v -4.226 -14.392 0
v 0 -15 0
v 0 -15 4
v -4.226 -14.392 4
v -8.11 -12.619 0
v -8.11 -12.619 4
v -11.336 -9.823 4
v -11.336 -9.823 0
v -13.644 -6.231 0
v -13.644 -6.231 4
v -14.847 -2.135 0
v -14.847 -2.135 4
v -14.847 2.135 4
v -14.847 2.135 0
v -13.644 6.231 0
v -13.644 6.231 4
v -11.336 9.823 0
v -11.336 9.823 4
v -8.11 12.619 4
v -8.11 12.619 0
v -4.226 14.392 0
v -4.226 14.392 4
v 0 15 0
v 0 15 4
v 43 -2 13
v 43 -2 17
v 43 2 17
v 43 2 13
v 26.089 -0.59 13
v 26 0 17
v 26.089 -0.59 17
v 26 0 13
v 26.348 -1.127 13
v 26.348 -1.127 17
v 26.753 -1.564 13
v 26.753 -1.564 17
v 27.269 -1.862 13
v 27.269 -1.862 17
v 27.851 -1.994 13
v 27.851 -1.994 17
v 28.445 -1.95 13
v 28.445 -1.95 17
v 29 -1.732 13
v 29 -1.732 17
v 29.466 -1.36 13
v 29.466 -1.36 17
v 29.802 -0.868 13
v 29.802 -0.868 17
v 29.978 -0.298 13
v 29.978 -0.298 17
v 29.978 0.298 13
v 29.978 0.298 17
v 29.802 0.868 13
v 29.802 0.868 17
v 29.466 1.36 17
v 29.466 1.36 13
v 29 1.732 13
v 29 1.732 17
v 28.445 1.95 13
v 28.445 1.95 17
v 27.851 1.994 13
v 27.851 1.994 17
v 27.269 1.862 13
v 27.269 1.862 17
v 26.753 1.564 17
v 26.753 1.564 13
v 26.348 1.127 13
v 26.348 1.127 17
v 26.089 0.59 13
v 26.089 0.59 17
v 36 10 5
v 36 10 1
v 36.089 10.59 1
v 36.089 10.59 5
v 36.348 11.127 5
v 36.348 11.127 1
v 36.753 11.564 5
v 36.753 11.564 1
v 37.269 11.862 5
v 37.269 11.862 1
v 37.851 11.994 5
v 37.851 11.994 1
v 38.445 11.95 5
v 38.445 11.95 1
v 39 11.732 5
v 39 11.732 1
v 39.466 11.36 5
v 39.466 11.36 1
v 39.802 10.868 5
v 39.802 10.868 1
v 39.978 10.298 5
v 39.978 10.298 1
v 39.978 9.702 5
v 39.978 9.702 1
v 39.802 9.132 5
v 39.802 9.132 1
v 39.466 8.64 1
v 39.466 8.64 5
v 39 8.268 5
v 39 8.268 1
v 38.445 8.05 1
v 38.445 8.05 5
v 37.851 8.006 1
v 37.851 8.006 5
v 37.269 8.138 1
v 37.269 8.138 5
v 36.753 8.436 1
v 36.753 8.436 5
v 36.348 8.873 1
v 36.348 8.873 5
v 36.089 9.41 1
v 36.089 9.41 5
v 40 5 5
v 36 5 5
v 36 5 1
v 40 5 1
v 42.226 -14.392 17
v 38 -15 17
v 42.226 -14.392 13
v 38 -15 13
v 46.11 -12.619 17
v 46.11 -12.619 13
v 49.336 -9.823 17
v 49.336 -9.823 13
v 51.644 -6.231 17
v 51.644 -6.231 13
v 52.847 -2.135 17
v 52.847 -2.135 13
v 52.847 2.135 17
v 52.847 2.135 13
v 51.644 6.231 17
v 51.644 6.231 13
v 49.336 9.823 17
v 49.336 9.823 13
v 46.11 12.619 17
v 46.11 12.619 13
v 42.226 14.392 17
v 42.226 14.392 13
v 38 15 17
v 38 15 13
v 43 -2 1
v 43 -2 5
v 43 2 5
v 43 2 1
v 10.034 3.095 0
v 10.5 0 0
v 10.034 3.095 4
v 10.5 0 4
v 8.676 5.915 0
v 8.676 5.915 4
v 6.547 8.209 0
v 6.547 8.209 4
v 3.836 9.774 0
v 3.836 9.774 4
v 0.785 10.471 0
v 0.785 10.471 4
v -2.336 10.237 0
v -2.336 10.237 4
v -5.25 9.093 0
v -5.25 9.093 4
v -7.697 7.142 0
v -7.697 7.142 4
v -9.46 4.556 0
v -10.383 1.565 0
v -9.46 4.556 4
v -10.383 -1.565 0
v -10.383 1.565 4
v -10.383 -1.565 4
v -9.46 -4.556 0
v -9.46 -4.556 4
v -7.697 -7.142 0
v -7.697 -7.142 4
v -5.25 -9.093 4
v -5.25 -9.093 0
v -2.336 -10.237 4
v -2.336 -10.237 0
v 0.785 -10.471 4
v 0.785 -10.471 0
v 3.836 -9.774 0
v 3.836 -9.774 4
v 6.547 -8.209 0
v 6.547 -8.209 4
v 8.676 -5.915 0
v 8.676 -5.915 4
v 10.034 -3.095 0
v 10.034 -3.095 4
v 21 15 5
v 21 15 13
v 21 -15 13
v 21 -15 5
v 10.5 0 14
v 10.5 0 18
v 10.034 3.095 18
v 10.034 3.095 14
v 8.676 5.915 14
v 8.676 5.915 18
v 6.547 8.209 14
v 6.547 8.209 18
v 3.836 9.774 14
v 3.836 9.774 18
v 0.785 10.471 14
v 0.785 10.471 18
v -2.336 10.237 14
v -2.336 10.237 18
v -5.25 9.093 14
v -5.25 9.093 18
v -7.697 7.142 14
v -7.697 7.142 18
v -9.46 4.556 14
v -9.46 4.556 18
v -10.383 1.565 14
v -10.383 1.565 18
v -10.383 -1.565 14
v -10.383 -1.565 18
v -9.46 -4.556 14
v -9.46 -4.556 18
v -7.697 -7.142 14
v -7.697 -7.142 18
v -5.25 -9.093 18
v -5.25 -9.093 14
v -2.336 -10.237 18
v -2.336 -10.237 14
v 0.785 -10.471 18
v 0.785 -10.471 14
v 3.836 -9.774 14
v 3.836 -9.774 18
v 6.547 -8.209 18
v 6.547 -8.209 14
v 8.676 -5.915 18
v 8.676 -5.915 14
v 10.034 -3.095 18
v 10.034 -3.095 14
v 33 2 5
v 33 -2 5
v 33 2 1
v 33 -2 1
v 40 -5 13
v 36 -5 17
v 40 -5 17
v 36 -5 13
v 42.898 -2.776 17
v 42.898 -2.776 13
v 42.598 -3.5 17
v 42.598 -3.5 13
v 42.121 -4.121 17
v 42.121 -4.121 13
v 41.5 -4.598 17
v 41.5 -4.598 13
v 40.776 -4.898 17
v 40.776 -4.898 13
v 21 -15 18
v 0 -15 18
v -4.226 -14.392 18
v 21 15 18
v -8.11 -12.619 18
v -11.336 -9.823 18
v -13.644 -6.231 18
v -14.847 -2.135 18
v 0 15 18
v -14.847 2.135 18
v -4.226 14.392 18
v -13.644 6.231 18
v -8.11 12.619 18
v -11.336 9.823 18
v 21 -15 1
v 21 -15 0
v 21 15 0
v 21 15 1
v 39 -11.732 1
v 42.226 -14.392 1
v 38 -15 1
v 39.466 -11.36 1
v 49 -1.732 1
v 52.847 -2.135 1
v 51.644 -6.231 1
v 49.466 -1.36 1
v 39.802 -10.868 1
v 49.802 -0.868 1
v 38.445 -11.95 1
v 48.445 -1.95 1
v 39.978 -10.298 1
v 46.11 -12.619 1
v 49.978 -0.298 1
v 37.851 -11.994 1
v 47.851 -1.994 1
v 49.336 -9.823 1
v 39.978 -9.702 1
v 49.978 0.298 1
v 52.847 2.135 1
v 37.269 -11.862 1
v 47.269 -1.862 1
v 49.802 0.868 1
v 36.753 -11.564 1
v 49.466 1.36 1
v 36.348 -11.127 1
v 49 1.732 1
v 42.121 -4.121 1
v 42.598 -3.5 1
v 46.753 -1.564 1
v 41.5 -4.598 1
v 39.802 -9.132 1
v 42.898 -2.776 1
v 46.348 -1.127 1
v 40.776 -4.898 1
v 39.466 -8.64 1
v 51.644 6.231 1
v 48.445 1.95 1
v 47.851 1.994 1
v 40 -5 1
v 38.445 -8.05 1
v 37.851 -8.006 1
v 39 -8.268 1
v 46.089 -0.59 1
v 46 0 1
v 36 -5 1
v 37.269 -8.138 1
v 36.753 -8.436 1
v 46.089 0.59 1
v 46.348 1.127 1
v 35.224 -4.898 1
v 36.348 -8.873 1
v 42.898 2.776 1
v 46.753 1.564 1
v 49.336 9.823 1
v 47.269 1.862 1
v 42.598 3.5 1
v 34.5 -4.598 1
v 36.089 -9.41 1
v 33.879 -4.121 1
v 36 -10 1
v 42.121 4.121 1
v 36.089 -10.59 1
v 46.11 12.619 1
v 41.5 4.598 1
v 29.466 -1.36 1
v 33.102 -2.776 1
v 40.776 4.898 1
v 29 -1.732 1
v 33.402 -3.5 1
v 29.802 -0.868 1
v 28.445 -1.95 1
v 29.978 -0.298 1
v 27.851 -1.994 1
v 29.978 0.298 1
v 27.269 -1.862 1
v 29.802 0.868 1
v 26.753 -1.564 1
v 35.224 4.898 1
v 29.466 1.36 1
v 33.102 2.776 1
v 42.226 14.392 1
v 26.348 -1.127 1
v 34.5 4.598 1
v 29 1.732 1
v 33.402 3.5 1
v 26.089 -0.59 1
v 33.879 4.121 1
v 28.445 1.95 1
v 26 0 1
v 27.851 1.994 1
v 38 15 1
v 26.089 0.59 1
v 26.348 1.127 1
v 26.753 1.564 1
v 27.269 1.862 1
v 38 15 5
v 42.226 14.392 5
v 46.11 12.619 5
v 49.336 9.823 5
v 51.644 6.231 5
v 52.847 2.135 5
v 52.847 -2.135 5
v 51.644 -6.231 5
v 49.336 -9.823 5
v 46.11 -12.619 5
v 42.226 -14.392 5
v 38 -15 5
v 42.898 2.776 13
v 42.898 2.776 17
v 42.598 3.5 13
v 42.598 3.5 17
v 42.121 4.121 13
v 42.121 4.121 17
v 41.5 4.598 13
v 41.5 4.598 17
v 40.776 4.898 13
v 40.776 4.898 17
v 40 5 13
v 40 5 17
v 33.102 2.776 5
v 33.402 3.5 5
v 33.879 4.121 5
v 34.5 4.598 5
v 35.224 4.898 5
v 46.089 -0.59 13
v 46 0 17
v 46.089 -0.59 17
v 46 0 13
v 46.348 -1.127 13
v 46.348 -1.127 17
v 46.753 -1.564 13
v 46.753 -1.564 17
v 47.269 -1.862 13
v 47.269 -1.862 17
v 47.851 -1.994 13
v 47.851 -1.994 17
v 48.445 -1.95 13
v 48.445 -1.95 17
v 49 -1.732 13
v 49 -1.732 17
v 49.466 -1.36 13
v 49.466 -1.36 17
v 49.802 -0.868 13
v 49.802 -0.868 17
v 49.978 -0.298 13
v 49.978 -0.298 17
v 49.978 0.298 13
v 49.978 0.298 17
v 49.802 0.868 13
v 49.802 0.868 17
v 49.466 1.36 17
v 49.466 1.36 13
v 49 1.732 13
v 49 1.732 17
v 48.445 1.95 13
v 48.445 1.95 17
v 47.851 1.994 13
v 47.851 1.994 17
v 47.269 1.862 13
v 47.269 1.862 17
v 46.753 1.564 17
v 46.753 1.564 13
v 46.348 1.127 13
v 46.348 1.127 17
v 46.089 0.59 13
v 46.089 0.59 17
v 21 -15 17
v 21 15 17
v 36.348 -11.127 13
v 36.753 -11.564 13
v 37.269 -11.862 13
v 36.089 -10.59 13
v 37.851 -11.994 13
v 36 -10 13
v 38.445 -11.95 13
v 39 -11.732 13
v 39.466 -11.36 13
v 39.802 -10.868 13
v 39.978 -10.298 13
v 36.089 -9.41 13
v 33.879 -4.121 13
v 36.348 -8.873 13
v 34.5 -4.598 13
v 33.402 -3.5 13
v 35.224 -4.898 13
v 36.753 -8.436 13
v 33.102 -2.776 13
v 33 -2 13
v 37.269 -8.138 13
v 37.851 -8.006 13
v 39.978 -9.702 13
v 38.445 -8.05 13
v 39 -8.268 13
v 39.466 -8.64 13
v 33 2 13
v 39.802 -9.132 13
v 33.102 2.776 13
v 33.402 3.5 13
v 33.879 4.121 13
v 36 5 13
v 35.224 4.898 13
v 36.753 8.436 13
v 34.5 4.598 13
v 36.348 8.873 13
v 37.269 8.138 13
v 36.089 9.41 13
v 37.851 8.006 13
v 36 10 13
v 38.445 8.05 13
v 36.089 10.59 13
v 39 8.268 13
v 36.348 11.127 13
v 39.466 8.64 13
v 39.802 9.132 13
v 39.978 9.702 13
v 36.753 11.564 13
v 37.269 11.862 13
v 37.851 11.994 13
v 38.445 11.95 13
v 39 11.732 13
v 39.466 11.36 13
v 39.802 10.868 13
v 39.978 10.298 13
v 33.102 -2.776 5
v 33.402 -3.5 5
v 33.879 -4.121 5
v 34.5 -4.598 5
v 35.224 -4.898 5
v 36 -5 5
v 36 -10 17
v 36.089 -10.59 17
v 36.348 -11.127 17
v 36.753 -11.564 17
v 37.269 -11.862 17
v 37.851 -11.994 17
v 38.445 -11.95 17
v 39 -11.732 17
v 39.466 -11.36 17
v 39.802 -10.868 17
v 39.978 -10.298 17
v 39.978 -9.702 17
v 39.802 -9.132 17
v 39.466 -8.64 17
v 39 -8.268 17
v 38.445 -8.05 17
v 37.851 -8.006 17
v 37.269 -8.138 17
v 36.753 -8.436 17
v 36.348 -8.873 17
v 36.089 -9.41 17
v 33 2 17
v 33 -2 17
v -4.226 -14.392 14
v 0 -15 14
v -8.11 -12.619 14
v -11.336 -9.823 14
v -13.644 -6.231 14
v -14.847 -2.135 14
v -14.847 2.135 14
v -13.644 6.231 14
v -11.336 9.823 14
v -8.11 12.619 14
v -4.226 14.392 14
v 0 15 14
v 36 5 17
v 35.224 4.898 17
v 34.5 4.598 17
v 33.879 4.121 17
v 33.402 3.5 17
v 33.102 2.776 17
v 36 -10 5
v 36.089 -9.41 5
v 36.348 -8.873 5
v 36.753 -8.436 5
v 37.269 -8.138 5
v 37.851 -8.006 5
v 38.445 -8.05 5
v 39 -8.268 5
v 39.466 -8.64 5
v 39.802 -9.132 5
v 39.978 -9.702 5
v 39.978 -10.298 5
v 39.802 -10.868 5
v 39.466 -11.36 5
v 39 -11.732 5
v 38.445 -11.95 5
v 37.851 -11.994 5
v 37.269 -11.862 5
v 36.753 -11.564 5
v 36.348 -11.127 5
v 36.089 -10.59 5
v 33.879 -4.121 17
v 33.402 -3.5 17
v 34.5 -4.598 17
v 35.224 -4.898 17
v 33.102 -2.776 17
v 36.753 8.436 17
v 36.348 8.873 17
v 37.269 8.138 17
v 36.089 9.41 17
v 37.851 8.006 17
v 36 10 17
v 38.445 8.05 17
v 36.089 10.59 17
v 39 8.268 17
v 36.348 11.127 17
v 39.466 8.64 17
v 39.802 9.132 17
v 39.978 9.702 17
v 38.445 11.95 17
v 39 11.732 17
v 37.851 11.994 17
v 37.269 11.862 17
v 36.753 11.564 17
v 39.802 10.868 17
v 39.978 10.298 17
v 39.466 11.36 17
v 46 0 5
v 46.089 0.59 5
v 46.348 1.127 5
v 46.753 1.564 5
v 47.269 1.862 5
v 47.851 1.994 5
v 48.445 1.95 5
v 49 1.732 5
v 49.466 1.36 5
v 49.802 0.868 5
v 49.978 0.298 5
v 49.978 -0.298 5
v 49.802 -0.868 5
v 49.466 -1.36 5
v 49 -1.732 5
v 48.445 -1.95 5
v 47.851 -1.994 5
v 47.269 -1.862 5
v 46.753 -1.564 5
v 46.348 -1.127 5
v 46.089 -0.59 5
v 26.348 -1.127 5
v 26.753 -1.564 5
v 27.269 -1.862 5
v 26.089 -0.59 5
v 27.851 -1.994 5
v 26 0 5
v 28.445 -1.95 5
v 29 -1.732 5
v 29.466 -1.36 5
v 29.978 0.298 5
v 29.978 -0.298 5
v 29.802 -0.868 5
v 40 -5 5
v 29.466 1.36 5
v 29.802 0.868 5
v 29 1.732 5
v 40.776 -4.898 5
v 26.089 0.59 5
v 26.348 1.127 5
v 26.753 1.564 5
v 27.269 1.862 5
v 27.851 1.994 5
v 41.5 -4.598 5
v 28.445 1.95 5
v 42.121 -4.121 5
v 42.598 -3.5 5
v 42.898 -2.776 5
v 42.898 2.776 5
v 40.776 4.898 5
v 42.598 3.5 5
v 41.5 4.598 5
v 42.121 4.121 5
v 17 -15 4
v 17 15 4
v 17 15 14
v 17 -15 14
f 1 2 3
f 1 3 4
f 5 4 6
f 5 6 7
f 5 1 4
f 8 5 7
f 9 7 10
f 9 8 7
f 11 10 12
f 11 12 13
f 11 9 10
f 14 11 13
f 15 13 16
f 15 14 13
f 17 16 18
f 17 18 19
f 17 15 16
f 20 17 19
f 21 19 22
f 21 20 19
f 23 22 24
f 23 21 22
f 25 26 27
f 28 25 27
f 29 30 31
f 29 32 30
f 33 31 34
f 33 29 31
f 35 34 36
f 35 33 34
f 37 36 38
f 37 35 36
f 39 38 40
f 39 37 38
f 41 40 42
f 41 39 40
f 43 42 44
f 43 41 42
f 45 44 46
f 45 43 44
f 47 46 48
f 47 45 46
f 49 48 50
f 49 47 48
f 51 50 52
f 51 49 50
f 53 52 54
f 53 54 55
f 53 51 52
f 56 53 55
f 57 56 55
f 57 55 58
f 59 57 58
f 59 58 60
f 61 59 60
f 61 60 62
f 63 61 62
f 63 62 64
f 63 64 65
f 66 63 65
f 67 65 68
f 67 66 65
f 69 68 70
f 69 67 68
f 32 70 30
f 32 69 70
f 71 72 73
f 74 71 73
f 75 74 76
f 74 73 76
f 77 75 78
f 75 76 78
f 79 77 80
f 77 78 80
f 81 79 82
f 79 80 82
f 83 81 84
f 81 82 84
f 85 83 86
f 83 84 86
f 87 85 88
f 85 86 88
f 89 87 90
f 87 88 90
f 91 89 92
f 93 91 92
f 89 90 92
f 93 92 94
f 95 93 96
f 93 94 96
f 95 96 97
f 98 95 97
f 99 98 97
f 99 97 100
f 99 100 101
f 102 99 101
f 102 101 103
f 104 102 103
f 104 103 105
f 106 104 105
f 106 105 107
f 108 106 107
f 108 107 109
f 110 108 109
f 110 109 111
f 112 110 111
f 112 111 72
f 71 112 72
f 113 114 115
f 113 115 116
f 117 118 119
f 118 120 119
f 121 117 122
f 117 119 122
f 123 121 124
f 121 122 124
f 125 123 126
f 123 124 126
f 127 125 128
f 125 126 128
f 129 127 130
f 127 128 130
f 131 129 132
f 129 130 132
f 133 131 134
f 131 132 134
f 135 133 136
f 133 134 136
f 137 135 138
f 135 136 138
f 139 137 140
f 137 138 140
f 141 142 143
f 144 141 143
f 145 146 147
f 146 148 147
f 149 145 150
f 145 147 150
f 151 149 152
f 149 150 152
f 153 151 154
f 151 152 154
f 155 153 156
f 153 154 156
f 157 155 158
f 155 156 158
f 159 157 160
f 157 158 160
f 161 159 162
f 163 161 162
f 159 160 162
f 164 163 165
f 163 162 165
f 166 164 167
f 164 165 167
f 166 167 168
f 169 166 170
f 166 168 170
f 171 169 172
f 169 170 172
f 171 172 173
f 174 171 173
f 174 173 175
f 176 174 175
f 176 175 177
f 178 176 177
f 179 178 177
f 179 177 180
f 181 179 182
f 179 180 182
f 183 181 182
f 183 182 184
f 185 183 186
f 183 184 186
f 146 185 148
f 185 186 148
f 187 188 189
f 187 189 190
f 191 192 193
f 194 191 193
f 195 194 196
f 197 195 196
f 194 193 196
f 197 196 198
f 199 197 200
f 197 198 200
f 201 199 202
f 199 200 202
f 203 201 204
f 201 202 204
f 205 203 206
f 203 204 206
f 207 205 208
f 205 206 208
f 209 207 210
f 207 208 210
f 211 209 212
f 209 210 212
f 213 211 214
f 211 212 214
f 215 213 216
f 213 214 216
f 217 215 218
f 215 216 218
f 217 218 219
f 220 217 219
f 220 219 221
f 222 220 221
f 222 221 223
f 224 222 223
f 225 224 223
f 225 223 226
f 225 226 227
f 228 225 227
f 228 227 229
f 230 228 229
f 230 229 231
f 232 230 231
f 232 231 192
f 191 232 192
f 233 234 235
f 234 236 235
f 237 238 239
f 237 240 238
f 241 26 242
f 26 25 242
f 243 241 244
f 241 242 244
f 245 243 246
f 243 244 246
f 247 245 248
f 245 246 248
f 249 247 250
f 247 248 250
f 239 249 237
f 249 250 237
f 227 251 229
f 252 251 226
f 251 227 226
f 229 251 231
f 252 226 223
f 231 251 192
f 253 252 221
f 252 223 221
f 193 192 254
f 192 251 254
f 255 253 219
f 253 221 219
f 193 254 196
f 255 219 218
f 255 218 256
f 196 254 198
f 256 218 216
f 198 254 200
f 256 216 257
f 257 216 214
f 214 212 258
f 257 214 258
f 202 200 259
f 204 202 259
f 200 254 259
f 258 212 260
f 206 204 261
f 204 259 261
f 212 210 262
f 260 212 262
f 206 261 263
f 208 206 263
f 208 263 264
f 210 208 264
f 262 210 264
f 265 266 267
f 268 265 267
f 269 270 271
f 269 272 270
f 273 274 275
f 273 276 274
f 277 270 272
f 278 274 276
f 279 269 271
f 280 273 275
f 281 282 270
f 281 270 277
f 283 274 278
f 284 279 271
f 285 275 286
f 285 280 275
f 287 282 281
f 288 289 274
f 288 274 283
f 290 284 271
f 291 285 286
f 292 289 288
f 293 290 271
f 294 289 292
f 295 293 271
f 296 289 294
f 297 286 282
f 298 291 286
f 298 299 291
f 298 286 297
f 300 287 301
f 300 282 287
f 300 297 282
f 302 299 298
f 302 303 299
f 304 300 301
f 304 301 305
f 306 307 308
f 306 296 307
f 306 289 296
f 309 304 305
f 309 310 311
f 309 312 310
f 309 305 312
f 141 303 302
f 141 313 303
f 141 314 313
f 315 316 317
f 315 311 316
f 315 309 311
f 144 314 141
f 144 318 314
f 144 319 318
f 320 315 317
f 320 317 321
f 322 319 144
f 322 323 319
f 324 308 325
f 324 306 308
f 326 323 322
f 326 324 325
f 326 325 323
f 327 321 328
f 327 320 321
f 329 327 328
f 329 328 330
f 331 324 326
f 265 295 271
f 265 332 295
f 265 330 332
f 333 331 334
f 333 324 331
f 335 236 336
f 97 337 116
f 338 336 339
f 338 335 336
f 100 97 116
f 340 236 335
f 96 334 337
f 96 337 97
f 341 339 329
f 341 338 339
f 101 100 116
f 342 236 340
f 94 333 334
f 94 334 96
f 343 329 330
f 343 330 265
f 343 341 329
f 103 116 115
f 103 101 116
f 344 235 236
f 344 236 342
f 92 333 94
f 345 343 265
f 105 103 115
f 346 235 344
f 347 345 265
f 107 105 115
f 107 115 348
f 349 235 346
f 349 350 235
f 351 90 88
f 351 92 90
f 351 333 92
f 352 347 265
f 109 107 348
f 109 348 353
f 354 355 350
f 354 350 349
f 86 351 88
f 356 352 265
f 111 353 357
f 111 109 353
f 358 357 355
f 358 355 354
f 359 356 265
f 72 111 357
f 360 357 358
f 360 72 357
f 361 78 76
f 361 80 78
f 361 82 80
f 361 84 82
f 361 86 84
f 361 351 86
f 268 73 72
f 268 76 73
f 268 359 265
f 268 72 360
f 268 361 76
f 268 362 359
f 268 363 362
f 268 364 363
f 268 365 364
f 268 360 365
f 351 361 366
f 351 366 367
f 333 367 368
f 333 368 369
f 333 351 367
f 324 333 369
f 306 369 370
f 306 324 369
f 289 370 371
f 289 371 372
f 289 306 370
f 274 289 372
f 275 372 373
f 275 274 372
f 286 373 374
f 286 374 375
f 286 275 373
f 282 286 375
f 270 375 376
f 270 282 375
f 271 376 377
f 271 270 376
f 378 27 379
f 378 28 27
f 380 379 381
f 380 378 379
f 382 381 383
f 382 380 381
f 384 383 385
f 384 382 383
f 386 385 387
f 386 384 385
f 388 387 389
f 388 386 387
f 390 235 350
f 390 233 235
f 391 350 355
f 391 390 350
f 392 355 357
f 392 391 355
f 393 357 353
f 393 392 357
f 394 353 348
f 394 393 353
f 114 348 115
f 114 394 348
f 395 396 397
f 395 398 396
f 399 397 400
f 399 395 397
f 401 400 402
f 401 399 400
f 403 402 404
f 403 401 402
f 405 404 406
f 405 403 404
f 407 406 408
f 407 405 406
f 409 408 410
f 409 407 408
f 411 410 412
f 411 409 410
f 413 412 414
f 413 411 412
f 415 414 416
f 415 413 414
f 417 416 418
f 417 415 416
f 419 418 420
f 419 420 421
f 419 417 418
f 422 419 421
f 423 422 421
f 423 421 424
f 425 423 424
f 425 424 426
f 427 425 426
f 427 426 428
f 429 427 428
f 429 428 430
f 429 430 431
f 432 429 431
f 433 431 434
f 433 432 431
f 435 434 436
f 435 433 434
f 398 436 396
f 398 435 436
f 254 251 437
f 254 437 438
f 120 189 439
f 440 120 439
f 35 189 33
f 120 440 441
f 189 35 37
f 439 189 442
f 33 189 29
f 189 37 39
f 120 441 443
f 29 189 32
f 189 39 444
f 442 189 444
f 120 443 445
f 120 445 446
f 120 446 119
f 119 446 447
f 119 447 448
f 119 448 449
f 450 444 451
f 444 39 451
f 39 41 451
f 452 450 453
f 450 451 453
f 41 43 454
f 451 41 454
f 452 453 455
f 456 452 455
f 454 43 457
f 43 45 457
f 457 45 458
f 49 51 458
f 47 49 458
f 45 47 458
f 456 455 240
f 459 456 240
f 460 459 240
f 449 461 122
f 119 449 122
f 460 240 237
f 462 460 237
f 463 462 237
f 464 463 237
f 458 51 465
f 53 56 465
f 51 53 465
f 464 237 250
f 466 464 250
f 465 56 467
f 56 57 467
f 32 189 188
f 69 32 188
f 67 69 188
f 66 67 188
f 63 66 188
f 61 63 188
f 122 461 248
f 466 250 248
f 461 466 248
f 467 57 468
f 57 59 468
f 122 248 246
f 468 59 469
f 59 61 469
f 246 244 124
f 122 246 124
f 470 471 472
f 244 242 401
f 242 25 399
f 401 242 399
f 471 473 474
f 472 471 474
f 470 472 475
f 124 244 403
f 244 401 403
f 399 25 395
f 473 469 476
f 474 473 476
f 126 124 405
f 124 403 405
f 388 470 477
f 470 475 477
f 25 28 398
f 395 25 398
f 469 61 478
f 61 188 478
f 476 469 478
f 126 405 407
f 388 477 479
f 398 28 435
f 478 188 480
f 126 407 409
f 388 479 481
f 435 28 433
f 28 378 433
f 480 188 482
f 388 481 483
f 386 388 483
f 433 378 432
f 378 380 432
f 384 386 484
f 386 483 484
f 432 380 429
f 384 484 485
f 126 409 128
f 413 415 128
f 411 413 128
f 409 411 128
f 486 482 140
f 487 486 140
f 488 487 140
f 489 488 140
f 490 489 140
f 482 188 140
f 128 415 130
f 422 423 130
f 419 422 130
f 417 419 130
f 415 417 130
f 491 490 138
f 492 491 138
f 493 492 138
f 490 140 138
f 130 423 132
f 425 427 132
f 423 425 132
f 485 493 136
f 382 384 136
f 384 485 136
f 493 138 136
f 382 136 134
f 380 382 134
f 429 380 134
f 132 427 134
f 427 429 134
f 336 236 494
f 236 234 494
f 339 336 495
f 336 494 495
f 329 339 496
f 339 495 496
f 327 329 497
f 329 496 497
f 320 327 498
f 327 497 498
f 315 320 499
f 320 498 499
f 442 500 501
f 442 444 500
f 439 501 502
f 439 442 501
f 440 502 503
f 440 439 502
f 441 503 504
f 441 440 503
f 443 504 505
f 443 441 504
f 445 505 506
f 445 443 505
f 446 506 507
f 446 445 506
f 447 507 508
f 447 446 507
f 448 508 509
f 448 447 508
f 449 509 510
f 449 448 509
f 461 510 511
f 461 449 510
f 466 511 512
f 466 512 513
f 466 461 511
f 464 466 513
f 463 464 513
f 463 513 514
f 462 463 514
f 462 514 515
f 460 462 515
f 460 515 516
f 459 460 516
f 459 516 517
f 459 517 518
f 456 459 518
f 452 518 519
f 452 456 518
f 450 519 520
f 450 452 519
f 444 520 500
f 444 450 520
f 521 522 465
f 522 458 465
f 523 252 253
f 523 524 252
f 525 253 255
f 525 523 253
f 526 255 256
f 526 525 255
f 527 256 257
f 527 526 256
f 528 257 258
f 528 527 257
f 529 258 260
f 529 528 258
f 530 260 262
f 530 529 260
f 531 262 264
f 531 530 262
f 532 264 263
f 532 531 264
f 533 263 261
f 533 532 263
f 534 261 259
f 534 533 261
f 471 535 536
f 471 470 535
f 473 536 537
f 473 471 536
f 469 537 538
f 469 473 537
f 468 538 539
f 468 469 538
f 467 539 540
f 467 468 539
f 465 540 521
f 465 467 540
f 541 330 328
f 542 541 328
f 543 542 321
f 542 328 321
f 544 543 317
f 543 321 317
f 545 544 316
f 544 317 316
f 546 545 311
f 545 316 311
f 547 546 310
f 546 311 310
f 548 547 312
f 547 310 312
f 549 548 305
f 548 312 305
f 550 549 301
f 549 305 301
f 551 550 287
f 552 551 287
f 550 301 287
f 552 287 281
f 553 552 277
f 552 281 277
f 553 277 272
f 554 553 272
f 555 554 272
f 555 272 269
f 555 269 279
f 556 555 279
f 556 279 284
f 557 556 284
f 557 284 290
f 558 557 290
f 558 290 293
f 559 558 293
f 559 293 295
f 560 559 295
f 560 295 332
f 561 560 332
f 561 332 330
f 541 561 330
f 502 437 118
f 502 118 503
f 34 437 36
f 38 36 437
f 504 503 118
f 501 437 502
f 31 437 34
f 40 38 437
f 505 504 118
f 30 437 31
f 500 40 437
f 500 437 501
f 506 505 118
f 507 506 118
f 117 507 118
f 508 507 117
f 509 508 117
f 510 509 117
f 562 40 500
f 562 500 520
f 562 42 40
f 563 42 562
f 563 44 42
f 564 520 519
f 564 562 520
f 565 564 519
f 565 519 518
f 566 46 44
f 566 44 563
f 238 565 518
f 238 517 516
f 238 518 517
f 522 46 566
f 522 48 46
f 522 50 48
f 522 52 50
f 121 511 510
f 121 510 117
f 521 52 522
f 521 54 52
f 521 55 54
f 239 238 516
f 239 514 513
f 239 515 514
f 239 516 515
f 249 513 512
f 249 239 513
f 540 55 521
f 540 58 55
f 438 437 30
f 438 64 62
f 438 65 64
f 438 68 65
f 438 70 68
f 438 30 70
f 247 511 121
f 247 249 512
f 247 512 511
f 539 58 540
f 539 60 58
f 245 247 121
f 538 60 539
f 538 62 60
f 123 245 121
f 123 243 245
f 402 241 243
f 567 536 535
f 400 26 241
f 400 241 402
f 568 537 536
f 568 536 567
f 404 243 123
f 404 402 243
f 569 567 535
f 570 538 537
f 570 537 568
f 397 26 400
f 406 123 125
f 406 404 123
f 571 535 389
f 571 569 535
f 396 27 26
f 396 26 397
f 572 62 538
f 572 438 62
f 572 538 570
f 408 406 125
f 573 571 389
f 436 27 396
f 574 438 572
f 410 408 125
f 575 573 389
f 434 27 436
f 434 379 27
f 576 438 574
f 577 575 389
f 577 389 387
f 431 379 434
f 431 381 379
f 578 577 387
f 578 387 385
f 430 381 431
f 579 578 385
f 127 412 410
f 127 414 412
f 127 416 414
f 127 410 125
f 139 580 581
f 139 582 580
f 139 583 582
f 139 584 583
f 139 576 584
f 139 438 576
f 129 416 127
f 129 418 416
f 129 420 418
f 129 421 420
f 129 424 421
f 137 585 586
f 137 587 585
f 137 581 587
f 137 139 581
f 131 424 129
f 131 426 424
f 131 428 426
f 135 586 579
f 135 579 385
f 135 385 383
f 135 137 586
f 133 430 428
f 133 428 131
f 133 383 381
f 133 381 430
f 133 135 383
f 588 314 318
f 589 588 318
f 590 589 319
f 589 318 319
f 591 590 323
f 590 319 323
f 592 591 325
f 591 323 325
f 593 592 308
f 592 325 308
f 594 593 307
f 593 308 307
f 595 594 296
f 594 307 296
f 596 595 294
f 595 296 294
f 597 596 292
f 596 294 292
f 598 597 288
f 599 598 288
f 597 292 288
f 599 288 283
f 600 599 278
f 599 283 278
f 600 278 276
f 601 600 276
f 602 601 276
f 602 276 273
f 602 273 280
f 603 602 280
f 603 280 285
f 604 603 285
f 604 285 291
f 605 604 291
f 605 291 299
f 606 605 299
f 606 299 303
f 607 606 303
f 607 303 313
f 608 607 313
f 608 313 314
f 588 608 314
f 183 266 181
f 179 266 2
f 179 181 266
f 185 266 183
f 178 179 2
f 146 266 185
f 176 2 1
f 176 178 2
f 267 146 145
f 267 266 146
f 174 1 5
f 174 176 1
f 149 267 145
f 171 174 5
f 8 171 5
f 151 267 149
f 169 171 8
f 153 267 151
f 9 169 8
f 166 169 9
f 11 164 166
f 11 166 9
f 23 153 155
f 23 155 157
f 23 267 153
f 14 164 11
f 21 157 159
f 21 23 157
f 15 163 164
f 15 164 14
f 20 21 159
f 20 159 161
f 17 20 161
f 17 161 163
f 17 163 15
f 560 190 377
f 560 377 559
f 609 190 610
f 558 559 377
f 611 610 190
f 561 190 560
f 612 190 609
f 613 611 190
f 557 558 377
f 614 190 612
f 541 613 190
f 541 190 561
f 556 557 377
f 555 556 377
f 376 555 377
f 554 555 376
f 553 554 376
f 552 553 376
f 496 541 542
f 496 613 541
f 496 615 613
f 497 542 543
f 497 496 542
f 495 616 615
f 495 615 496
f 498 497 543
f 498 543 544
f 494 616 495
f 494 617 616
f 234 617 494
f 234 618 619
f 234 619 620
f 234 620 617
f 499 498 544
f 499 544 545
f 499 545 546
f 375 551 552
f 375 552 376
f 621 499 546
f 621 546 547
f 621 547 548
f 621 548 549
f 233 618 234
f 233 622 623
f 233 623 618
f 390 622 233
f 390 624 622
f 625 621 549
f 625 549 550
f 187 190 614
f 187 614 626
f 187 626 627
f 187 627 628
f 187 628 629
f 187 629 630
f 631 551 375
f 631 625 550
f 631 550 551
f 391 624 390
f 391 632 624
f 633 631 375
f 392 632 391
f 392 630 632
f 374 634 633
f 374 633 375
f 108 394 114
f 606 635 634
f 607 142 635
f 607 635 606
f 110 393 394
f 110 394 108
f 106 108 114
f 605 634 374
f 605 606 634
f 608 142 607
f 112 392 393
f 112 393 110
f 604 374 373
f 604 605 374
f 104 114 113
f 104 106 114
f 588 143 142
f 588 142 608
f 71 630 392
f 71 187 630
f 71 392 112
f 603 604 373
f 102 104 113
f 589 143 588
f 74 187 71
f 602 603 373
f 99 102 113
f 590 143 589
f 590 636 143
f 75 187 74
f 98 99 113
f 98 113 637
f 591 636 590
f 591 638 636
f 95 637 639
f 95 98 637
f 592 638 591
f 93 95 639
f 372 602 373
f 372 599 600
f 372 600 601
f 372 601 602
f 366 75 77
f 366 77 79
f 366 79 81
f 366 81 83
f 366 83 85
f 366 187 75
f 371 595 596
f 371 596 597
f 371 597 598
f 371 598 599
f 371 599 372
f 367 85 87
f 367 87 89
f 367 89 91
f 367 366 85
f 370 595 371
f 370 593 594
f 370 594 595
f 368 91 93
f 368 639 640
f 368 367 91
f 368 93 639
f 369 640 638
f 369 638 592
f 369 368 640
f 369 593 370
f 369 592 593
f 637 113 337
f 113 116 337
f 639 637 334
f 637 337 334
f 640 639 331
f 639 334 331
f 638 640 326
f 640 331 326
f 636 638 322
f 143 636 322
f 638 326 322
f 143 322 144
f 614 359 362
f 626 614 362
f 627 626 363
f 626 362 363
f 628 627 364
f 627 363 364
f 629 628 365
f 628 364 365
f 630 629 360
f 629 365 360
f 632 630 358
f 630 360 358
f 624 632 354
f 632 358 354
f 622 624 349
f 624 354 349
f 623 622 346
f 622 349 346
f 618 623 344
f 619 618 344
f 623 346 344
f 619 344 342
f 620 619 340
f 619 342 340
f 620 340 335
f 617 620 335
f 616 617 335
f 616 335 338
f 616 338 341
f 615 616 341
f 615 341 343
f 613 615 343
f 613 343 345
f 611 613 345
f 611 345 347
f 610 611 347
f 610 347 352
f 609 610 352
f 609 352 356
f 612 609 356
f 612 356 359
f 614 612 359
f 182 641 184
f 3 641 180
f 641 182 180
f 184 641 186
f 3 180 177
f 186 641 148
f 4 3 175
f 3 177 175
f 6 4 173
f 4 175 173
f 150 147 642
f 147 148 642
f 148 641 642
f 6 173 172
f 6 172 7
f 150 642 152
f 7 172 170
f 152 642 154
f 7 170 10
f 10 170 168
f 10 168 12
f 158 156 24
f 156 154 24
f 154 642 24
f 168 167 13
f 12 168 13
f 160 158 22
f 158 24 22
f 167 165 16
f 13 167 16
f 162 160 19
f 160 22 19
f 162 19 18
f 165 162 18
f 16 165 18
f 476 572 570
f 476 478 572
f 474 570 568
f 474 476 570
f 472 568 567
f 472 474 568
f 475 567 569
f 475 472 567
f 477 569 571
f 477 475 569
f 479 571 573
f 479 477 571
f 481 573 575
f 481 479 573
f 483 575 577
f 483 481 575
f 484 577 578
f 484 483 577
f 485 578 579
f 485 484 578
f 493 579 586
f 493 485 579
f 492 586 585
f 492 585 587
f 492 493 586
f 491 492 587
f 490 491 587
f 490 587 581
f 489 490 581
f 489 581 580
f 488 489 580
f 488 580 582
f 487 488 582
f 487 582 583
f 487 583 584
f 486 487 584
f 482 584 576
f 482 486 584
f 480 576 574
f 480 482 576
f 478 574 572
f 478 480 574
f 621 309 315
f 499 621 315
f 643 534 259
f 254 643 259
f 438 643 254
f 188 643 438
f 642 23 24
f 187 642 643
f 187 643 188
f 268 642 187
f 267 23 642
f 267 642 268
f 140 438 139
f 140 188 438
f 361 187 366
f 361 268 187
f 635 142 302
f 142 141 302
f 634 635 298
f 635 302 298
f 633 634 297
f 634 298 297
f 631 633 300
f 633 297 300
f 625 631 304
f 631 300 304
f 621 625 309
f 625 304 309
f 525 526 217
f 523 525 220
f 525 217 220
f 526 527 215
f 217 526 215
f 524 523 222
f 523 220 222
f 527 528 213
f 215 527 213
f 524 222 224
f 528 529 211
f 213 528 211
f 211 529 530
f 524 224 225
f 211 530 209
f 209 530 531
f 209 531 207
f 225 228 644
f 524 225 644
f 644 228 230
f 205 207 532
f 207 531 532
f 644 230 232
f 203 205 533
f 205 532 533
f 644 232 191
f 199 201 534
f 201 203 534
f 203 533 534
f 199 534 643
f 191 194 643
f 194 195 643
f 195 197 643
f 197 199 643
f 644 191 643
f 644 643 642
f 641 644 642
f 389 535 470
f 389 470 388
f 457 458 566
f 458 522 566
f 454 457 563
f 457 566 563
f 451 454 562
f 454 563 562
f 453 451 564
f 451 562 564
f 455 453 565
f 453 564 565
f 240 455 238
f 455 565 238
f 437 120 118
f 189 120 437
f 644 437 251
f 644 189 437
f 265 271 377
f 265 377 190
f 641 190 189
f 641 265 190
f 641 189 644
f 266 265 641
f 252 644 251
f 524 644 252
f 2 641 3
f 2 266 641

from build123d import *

# Parameters (mm, degrees)
EXTRUDE_1_DEPTH     = 18
SKETCH_2_W          = 32
SKETCH_2_H          = 12
CUT_EXTRUDE_1_DEPTH = 34
SKETCH_3_W          = 32
SKETCH_3_H          = 8
CUT_EXTRUDE_2_DEPTH = 34
SKETCH_4_R          = 10.5
CUT_EXTRUDE_3_DEPTH = 34
SKETCH_5_W          = 36.797591779
SKETCH_5_H          = 31.340238438
CUT_EXTRUDE_4_DEPTH = 2
SKETCH_6_W          = 48.194095428
SKETCH_6_H          = 31.947752294
CUT_EXTRUDE_5_DEPTH = 2
SKETCH_7_R          = 2
CUT_EXTRUDE_6_DEPTH = 20
SKETCH_8_W          = 5
SKETCH_8_H          = 10
CUT_EXTRUDE_7_DEPTH = 20
SKETCH_9_R          = 10.5
EXTRUDE_2_DEPTH     = 4
SKETCH_10_R         = 10.5
EXTRUDE_3_DEPTH     = 4
SKETCH_11_R         = 2
SKETCH_11_W         = 5
SKETCH_11_H         = 10
EXTRUDE_4_DEPTH     = 1
EXTRUDE_START       = 1
SKETCH_12_R         = 2
SKETCH_12_W         = 5
SKETCH_12_H         = 10
EXTRUDE_5_DEPTH     = 1
SKETCH_13_W         = 5
SKETCH_13_H         = 10
CUT_EXTRUDE_8_DEPTH = 19
FILLET_1_R          = 3


with BuildPart() as part:
    # 草图1 → 凸台-拉伸1 (new body)
    with BuildSketch(Plane.XY):
        with BuildLine():
            Line((0, 15), (38, 15))
            ThreePointArc((38, 15), (53, 0), (38, -15))
            Line((38, -15), (0, -15))
            ThreePointArc((0, -15), (-15, 0), (0, 15))
        make_face()
    extrude(amount=EXTRUDE_1_DEPTH)

    # 草图2 → 切除-拉伸1 (cut)
    with BuildSketch(Plane(origin=(0, 15, 0), x_dir=(1, 0, 0), z_dir=(0, 1, 0))):
        with Locations((1, -9)):
            Rectangle(SKETCH_2_W, SKETCH_2_H)
    extrude(amount=-CUT_EXTRUDE_1_DEPTH, mode=Mode.SUBTRACT)

    # 草图3 → 切除-拉伸2 (cut)
    with BuildSketch(Plane(origin=(0, 15, 0), x_dir=(1, 0, 0), z_dir=(0, 1, 0))):
        with Locations((37, -9)):
            Rectangle(SKETCH_3_W, SKETCH_3_H)
    extrude(amount=-CUT_EXTRUDE_2_DEPTH, mode=Mode.SUBTRACT)

    # 草图4 → 切除-拉伸3 (cut)
    with BuildSketch(Plane.XY.offset(18)):
        Circle(SKETCH_4_R)
    extrude(amount=-CUT_EXTRUDE_3_DEPTH, mode=Mode.SUBTRACT)

    # 草图5 → 切除-拉伸4 (cut)
    with BuildSketch(Plane.XY.offset(18)):
        with Locations((39.39879589, -0.670119219)):
            Rectangle(SKETCH_5_W, SKETCH_5_H)
    extrude(amount=-CUT_EXTRUDE_4_DEPTH, mode=Mode.SUBTRACT)

    # 草图6 → 切除-拉伸5 (cut)
    with BuildSketch(Plane(origin=(0, 0, 0), x_dir=(-1, 0, 0), z_dir=(0, 0, -1))):
        with Locations((-45.097047714, -0.973876147)):
            Rectangle(SKETCH_6_W, SKETCH_6_H)
    extrude(amount=-CUT_EXTRUDE_5_DEPTH, mode=Mode.SUBTRACT)

    # 草图7 → 切除-拉伸6 (cut)
    with BuildSketch(Plane(origin=(0, 0, 2), x_dir=(-1, 0, 0), z_dir=(0, 0, -1))):
        with Locations((-48, 0)):
            Circle(SKETCH_7_R)
        with Locations((-38, 10)):
            Circle(SKETCH_7_R)
        with Locations((-28, 0)):
            Circle(SKETCH_7_R)
        with Locations((-38, -10)):
            Circle(SKETCH_7_R)
    extrude(amount=-CUT_EXTRUDE_6_DEPTH, mode=Mode.SUBTRACT)

    # 草图8 → 切除-拉伸7 (cut)
    with BuildSketch(Plane(origin=(0, 0, 2), x_dir=(-1, 0, 0), z_dir=(0, 0, -1))):
        with Locations((-35.5, 0)):
            Rectangle(SKETCH_8_W, SKETCH_8_H)
    extrude(amount=-CUT_EXTRUDE_7_DEPTH, mode=Mode.SUBTRACT)

    # 草图9 → 凸台-拉伸2 (add)
    with BuildSketch(Plane(origin=(0, 0, 0), x_dir=(-1, 0, 0), z_dir=(0, 0, -1))):
        with BuildLine():
            Line((0, 15), (-21, 15))
            Line((-21, 15), (-21, -15))
            Line((-21, -15), (0, -15))
            ThreePointArc((0, -15), (15, 0), (0, 15))
        make_face()
        with Locations(Location((0, 0, 0), (0, 0, 180))):
            Circle(SKETCH_9_R, mode=Mode.SUBTRACT)
    extrude(amount=-EXTRUDE_2_DEPTH)

    # 草图10 → 凸台-拉伸3 (add)
    with BuildSketch(Plane.XY.offset(18)):
        with BuildLine():
            Line((21, -15), (21, 15))
            Line((21, 15), (0, 15))
            ThreePointArc((0, 15), (-15, 0), (0, -15))
            Line((0, -15), (21, -15))
        make_face()
        Circle(SKETCH_10_R, mode=Mode.SUBTRACT)
    extrude(amount=-EXTRUDE_3_DEPTH)

    # 草图11 → 凸台-拉伸4 (add)
    with BuildSketch(Plane.XY.offset(16)):
        with BuildLine():
            Line((21, -15), (38, -15))
            ThreePointArc((38, -15), (53, 0), (38, 15))
            Line((38, 15), (21, 15))
            Line((21, 15), (21, -15))
        make_face()
        with Locations(Location((38, 10, 0), (0, 0, 180))):
            Circle(SKETCH_11_R, mode=Mode.SUBTRACT)
        with Locations(Location((38, -10, 0), (0, 0, 180))):
            Circle(SKETCH_11_R, mode=Mode.SUBTRACT)
        with Locations(Location((28, 0, 0), (0, 0, 180))):
            Circle(SKETCH_11_R, mode=Mode.SUBTRACT)
        with Locations(Location((48, 0, 0), (0, 0, 180))):
            Circle(SKETCH_11_R, mode=Mode.SUBTRACT)
        with Locations((35.5, 0)):
            Rectangle(SKETCH_11_W, SKETCH_11_H, mode=Mode.SUBTRACT)
    extrude(amount=EXTRUDE_4_DEPTH)

    # 草图12 → 凸台-拉伸5 (add)
    with BuildSketch(Plane(origin=(0, 0, 2), x_dir=(-1, 0, 0), z_dir=(0, 0, -1)).offset(EXTRUDE_START)):
        with BuildLine():
            Line((-21, -15), (-21, 15))
            Line((-21, 15), (-38, 15))
            ThreePointArc((-38, 15), (-53, 0), (-38, -15))
            Line((-38, -15), (-21, -15))
        make_face()
        with Locations((-48, 0)):
            Circle(SKETCH_12_R, mode=Mode.SUBTRACT)
        with Locations((-38, -10)):
            Circle(SKETCH_12_R, mode=Mode.SUBTRACT)
        with Locations((-28, 0)):
            Circle(SKETCH_12_R, mode=Mode.SUBTRACT)
        with Locations((-38, 10)):
            Circle(SKETCH_12_R, mode=Mode.SUBTRACT)
        with Locations((-35.5, 0)):
            Rectangle(SKETCH_12_W, SKETCH_12_H, mode=Mode.SUBTRACT)
    extrude(amount=-EXTRUDE_5_DEPTH)

    # 草图13 → 切除-拉伸8 (cut)
    with BuildSketch(Plane.XY.offset(17)):
        with Locations((40.5, 0)):
            Rectangle(SKETCH_13_W, SKETCH_13_H)
    extrude(amount=-CUT_EXTRUDE_8_DEPTH, mode=Mode.SUBTRACT)

    # 圆角1
    fillet_1_edges = [part.edges().sort_by_distance(p)[0] for p in [
        (33, 5, 14.5),
        (33, 5, 3),
        (33, -5, 14.5),
        (33, -5, 3),
        (43, 5, 15),
        (43, 5, 3),
        (43, -5, 15),
        (43, -5, 3),
    ]]
    fillet(fillet_1_edges, radius=FILLET_1_R)


solid = part.part
